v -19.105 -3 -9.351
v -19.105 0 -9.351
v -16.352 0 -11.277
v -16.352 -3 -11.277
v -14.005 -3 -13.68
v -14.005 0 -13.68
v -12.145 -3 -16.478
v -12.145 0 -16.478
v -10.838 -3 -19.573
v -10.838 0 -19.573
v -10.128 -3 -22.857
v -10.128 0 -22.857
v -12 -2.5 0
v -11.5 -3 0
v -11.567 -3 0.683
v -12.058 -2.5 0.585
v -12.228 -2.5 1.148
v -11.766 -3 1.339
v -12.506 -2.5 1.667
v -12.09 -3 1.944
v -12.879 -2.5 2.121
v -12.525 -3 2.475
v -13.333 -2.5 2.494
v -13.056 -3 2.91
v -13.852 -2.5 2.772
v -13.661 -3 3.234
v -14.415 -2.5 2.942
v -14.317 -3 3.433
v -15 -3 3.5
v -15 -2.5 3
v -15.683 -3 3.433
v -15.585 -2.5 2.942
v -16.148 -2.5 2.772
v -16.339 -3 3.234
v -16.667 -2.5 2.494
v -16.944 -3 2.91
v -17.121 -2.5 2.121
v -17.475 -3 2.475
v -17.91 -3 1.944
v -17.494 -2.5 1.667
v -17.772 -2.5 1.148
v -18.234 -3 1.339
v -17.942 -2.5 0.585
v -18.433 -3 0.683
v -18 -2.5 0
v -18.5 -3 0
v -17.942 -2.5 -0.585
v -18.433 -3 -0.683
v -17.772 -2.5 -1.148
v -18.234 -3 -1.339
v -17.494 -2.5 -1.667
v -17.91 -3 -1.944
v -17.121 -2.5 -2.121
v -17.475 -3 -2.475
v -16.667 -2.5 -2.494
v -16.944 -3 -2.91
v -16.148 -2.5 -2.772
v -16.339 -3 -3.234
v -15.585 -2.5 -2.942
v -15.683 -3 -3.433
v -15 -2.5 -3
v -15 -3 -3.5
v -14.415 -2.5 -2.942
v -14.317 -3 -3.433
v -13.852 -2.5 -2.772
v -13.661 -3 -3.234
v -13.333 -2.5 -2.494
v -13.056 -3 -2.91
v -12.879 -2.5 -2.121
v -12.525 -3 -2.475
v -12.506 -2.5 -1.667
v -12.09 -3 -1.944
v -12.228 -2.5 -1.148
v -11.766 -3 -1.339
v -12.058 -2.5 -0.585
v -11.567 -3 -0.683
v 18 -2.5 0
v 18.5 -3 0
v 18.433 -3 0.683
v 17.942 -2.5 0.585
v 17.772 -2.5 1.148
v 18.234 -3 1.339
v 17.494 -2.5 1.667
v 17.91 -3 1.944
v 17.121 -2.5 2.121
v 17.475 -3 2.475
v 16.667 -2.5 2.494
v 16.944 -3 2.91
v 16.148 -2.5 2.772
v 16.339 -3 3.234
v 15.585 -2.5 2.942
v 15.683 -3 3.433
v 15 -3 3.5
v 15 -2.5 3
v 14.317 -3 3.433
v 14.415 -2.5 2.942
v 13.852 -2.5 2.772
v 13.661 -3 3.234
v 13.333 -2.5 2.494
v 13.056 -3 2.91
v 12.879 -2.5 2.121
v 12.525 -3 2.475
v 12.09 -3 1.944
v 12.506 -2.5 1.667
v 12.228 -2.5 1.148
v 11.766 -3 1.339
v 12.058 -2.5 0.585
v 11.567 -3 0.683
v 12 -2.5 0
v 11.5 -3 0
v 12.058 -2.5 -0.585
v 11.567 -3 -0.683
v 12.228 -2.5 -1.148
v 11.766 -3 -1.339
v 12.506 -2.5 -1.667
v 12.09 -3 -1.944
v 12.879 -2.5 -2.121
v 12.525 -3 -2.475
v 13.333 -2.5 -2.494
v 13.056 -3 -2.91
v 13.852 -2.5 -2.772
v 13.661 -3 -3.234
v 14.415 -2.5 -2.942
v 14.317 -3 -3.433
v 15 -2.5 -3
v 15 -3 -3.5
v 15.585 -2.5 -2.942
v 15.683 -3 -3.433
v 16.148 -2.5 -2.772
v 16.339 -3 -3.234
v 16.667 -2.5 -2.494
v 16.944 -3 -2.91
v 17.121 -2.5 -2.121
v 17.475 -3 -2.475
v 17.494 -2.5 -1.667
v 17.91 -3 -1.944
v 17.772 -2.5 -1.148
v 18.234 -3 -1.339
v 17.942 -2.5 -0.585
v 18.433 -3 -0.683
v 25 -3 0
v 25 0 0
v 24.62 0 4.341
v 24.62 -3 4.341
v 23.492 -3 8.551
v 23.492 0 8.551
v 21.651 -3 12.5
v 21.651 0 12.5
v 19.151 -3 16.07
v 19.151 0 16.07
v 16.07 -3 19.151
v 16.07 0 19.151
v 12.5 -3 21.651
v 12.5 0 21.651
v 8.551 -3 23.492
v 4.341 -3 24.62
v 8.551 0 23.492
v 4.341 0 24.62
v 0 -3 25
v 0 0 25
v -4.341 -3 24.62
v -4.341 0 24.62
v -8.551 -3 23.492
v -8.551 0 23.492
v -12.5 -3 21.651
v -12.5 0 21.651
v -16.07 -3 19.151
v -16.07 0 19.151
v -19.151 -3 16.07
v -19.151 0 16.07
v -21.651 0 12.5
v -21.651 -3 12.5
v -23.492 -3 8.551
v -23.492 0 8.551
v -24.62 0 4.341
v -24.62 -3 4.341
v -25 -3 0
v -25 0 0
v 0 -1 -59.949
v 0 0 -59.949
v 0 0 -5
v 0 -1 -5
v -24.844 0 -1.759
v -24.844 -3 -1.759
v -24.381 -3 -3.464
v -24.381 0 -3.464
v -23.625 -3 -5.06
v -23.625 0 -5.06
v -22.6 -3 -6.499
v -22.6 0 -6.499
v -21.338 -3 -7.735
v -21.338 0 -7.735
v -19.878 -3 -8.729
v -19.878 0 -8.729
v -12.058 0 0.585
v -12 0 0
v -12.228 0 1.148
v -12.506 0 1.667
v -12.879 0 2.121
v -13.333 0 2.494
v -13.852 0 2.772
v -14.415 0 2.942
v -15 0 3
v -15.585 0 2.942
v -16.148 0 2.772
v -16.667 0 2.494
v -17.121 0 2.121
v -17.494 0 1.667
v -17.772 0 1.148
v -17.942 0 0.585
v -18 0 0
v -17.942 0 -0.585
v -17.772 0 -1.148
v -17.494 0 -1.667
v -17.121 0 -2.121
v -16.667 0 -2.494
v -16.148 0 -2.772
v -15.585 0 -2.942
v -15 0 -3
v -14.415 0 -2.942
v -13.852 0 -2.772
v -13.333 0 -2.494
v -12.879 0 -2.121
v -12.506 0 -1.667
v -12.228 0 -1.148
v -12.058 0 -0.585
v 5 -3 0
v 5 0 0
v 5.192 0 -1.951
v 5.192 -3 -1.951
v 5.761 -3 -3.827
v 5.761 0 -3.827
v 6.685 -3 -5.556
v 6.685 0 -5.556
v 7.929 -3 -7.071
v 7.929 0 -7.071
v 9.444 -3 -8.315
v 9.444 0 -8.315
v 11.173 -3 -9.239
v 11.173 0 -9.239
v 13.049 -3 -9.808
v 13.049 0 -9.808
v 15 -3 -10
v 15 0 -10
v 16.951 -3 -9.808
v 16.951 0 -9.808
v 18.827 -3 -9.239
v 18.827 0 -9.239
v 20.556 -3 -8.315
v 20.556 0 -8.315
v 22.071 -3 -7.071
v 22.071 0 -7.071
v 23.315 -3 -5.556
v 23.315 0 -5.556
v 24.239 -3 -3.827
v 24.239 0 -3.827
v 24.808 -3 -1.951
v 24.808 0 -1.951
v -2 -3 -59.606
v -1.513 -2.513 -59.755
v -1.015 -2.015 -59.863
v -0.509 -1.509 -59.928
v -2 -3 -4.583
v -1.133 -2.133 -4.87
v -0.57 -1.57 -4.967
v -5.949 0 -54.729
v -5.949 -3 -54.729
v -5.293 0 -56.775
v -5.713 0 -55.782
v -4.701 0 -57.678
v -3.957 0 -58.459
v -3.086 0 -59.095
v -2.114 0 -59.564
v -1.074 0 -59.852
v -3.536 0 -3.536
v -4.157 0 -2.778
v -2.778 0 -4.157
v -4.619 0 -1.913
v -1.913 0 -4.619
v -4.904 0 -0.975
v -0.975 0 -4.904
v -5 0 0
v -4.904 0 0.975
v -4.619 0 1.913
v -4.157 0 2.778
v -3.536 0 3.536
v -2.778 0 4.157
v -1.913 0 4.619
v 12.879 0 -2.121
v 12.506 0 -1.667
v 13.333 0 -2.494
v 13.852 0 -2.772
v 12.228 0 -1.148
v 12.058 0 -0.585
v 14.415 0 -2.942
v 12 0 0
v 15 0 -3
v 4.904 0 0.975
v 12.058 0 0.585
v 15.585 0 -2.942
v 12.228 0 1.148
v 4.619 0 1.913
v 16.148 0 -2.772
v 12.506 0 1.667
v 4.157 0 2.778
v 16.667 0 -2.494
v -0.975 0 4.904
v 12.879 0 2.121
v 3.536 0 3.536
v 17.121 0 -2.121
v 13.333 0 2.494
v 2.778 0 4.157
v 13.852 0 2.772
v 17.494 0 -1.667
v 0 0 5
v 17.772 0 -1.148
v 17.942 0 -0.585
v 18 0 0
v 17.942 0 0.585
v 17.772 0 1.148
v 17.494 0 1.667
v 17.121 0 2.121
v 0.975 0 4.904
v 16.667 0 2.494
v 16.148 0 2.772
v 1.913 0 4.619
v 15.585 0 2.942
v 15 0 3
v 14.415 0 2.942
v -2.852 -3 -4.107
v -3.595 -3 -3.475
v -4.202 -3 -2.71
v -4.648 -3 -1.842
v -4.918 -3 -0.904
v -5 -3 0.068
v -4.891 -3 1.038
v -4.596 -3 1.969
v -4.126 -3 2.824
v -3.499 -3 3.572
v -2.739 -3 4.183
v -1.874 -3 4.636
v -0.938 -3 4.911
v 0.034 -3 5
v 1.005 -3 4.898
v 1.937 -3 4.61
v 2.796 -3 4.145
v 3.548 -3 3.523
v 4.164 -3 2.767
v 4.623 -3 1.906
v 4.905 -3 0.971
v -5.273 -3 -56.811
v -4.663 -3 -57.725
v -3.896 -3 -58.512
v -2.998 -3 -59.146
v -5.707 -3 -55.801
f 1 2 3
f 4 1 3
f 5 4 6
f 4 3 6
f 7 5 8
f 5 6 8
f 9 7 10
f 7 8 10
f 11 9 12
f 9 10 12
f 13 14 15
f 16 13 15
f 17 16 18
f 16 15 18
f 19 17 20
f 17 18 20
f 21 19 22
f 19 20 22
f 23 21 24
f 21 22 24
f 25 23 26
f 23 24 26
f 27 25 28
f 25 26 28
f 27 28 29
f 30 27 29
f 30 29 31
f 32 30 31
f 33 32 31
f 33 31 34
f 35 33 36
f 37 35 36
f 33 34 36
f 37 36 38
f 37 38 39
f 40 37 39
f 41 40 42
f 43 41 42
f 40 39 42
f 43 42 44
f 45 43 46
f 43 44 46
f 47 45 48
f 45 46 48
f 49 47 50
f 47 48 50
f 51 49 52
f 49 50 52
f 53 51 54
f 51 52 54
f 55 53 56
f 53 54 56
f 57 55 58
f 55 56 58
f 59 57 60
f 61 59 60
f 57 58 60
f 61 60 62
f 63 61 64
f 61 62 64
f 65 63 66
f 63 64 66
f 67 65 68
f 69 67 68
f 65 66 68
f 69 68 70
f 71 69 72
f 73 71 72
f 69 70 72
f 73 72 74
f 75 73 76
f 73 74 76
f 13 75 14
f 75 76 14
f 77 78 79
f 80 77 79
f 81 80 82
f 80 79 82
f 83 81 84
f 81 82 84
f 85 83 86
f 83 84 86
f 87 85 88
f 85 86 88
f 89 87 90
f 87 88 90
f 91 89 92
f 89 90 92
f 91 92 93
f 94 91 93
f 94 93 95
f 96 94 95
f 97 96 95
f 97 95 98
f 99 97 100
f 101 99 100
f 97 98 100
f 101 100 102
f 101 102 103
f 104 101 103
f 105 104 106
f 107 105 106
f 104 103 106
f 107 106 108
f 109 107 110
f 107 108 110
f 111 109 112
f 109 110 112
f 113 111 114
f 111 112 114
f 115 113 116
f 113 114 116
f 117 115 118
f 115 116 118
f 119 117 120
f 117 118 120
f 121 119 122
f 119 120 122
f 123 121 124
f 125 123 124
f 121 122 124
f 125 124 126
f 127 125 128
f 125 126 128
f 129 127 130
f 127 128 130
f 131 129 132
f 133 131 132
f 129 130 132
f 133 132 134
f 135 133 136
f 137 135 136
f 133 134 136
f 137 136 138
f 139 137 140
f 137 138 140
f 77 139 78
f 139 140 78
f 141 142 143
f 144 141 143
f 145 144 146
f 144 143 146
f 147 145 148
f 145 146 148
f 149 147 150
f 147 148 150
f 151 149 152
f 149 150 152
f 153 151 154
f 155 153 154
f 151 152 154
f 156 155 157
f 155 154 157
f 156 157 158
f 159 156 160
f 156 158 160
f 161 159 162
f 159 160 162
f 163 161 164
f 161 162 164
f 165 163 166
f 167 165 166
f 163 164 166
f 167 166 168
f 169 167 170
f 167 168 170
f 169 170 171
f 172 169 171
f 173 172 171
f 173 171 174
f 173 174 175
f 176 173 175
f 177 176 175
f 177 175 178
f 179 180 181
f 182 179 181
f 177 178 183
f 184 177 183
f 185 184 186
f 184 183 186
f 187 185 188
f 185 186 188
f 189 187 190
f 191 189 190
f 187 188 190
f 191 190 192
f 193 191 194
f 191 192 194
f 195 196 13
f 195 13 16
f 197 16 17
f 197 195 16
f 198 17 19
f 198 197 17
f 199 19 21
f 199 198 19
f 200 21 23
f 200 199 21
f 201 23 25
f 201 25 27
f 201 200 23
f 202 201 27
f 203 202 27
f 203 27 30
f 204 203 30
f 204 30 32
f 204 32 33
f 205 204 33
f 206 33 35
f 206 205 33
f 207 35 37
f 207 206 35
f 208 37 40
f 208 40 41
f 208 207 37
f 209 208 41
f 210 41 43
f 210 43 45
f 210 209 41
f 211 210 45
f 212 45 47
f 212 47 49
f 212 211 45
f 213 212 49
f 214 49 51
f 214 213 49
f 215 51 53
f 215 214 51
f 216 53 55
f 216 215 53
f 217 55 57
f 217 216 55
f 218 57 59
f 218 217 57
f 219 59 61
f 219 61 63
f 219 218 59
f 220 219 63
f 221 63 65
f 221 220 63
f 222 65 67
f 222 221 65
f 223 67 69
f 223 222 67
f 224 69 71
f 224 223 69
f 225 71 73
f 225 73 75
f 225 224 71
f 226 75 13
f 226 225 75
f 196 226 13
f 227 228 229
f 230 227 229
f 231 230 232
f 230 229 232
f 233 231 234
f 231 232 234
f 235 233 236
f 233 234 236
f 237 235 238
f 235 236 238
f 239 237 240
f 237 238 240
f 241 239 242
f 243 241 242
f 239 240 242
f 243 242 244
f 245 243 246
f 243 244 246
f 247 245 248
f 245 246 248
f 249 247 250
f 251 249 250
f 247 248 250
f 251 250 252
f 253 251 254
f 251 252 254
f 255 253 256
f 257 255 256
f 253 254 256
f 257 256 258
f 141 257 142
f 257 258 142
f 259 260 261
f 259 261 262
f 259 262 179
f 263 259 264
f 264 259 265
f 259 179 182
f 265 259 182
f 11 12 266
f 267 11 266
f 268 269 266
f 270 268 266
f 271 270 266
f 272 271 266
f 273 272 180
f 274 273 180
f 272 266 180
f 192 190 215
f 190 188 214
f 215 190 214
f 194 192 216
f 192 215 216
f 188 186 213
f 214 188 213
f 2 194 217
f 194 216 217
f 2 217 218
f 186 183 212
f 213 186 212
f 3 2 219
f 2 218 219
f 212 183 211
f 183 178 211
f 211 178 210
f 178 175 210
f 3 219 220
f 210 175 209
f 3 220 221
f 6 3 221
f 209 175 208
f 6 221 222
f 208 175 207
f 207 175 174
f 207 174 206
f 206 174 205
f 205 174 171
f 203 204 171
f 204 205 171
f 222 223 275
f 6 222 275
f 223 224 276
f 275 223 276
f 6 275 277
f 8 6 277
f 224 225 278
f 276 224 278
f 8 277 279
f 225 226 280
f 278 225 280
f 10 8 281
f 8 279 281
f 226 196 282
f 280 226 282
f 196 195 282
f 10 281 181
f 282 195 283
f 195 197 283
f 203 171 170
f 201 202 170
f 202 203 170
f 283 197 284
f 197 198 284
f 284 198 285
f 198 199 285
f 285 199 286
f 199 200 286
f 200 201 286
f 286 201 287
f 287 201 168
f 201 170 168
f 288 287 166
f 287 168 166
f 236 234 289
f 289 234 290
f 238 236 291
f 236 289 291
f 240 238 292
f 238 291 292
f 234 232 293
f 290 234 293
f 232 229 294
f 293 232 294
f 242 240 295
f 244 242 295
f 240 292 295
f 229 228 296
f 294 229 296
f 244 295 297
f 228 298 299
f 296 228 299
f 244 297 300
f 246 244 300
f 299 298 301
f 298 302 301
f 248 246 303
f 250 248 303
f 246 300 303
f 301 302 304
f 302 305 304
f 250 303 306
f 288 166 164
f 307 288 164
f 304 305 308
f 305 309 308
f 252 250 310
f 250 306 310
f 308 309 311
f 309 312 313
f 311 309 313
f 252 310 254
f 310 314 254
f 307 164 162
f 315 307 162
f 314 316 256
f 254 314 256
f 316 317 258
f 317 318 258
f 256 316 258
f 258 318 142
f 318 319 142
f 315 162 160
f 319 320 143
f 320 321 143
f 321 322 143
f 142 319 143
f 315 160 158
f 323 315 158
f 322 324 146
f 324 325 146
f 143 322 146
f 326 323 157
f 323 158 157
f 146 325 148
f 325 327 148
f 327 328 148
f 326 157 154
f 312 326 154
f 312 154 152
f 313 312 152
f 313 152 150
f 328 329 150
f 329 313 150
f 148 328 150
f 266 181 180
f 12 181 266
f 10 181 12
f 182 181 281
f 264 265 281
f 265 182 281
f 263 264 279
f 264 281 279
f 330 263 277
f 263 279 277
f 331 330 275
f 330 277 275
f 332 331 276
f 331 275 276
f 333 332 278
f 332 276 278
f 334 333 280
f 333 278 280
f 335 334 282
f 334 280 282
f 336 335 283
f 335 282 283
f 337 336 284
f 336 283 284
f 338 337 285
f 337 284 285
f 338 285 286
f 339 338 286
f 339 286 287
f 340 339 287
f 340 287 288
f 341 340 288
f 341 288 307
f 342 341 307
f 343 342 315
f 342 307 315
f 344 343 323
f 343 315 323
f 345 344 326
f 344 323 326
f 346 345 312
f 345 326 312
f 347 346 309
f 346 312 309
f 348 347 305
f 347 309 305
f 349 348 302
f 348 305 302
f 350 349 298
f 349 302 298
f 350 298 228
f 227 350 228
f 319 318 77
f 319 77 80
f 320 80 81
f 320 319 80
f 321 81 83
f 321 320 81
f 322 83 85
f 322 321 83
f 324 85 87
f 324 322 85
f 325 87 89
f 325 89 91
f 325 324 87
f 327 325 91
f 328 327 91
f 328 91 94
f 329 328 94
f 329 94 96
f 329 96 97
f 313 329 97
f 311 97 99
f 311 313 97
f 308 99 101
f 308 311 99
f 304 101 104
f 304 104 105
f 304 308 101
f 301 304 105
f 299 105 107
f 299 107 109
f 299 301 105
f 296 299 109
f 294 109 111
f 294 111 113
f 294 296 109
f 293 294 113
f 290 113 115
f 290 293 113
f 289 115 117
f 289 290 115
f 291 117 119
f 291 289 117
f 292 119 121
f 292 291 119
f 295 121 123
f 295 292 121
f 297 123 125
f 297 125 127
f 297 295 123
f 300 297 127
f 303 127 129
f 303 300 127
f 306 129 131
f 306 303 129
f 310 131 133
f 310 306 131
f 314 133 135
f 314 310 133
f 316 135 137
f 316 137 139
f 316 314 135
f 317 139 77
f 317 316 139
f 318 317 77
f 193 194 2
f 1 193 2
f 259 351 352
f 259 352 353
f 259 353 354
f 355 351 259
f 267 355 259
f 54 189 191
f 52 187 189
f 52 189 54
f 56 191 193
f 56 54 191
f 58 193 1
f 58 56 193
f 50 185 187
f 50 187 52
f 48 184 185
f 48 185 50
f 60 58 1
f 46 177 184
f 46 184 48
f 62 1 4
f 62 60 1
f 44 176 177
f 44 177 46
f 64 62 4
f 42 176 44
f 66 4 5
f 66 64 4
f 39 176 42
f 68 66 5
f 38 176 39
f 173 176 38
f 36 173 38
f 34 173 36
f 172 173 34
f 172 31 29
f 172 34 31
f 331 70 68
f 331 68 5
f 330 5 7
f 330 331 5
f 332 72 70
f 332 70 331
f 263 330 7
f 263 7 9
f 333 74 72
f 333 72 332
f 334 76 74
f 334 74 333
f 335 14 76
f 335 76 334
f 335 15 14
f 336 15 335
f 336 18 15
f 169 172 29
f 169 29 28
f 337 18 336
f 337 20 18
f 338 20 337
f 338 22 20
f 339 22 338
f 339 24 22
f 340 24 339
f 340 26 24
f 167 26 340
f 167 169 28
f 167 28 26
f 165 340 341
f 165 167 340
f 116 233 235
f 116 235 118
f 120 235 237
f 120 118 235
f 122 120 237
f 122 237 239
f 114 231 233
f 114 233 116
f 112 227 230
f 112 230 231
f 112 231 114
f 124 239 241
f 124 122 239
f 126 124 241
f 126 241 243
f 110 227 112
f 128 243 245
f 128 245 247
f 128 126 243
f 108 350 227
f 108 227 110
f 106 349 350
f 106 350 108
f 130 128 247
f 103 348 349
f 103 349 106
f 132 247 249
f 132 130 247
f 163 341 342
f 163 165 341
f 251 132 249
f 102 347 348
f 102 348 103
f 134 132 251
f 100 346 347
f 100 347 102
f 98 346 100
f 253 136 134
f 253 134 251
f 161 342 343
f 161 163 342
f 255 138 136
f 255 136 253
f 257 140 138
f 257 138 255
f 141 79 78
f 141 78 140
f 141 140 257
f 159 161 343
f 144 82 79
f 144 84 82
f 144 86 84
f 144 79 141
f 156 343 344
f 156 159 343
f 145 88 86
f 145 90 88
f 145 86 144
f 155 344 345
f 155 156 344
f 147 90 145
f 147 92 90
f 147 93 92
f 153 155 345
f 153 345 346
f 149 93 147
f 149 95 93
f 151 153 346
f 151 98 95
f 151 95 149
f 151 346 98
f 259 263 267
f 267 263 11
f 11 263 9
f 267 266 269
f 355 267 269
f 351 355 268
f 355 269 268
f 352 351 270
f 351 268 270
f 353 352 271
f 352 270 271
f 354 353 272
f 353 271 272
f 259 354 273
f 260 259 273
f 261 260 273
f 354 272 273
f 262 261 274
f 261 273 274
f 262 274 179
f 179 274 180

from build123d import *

# Parameters (mm, degrees)
F0_R     = 3
F1_DEPTH = 3
F2_SIZE  = 0.5
F3_SIZE  = 2


with BuildPart() as f1:
    # F0 (on Front) → F1 (new body)
    with BuildSketch(Plane.XZ):
        with BuildLine():
            ThreePointArc((5, 0), (15, -10), (25, 0))
            ThreePointArc((25, 0), (0, 25), (-25, 0))
            ThreePointArc((-25, 0), (-23.625052, -5.060482), (-19.878305, -8.729384))
            Line((-19.878305, -8.729384), (-19.105368, -9.351182))
            ThreePointArc((-19.105368, -9.351182), (-13.00964, -15.035608), (-10.128077, -22.856554))
            Line((-10.128077, -22.856554), (-5.949082, -54.729208))
            ThreePointArc((-5.949082, -54.729208), (-3.957266, -58.459186), (0, -59.949192))
            Line((0, -59.949192), (0, -5))
            ThreePointArc((0, -5), (-3.535534, 3.535534), (5, 0))
        make_face()
        with Locations((-15, 0)):
            Circle(F0_R, mode=Mode.SUBTRACT)
        with Locations((15, 0)):
            Circle(F0_R, mode=Mode.SUBTRACT)
    extrude(amount=F1_DEPTH)

    # F2
    f2_edges = [f1.edges().sort_by_distance(p)[0] for p in [
        (-18, -3, 0),
        (12, -3, 0),
    ]]
    chamfer(f2_edges, length=F2_SIZE)

    # F3
    f3_edges = [f1.edges().sort_by_distance(p)[0] for p in [
        (0, -3, -32.474596),
    ]]
    chamfer(f3_edges, length=F3_SIZE)


solid = f1.part
